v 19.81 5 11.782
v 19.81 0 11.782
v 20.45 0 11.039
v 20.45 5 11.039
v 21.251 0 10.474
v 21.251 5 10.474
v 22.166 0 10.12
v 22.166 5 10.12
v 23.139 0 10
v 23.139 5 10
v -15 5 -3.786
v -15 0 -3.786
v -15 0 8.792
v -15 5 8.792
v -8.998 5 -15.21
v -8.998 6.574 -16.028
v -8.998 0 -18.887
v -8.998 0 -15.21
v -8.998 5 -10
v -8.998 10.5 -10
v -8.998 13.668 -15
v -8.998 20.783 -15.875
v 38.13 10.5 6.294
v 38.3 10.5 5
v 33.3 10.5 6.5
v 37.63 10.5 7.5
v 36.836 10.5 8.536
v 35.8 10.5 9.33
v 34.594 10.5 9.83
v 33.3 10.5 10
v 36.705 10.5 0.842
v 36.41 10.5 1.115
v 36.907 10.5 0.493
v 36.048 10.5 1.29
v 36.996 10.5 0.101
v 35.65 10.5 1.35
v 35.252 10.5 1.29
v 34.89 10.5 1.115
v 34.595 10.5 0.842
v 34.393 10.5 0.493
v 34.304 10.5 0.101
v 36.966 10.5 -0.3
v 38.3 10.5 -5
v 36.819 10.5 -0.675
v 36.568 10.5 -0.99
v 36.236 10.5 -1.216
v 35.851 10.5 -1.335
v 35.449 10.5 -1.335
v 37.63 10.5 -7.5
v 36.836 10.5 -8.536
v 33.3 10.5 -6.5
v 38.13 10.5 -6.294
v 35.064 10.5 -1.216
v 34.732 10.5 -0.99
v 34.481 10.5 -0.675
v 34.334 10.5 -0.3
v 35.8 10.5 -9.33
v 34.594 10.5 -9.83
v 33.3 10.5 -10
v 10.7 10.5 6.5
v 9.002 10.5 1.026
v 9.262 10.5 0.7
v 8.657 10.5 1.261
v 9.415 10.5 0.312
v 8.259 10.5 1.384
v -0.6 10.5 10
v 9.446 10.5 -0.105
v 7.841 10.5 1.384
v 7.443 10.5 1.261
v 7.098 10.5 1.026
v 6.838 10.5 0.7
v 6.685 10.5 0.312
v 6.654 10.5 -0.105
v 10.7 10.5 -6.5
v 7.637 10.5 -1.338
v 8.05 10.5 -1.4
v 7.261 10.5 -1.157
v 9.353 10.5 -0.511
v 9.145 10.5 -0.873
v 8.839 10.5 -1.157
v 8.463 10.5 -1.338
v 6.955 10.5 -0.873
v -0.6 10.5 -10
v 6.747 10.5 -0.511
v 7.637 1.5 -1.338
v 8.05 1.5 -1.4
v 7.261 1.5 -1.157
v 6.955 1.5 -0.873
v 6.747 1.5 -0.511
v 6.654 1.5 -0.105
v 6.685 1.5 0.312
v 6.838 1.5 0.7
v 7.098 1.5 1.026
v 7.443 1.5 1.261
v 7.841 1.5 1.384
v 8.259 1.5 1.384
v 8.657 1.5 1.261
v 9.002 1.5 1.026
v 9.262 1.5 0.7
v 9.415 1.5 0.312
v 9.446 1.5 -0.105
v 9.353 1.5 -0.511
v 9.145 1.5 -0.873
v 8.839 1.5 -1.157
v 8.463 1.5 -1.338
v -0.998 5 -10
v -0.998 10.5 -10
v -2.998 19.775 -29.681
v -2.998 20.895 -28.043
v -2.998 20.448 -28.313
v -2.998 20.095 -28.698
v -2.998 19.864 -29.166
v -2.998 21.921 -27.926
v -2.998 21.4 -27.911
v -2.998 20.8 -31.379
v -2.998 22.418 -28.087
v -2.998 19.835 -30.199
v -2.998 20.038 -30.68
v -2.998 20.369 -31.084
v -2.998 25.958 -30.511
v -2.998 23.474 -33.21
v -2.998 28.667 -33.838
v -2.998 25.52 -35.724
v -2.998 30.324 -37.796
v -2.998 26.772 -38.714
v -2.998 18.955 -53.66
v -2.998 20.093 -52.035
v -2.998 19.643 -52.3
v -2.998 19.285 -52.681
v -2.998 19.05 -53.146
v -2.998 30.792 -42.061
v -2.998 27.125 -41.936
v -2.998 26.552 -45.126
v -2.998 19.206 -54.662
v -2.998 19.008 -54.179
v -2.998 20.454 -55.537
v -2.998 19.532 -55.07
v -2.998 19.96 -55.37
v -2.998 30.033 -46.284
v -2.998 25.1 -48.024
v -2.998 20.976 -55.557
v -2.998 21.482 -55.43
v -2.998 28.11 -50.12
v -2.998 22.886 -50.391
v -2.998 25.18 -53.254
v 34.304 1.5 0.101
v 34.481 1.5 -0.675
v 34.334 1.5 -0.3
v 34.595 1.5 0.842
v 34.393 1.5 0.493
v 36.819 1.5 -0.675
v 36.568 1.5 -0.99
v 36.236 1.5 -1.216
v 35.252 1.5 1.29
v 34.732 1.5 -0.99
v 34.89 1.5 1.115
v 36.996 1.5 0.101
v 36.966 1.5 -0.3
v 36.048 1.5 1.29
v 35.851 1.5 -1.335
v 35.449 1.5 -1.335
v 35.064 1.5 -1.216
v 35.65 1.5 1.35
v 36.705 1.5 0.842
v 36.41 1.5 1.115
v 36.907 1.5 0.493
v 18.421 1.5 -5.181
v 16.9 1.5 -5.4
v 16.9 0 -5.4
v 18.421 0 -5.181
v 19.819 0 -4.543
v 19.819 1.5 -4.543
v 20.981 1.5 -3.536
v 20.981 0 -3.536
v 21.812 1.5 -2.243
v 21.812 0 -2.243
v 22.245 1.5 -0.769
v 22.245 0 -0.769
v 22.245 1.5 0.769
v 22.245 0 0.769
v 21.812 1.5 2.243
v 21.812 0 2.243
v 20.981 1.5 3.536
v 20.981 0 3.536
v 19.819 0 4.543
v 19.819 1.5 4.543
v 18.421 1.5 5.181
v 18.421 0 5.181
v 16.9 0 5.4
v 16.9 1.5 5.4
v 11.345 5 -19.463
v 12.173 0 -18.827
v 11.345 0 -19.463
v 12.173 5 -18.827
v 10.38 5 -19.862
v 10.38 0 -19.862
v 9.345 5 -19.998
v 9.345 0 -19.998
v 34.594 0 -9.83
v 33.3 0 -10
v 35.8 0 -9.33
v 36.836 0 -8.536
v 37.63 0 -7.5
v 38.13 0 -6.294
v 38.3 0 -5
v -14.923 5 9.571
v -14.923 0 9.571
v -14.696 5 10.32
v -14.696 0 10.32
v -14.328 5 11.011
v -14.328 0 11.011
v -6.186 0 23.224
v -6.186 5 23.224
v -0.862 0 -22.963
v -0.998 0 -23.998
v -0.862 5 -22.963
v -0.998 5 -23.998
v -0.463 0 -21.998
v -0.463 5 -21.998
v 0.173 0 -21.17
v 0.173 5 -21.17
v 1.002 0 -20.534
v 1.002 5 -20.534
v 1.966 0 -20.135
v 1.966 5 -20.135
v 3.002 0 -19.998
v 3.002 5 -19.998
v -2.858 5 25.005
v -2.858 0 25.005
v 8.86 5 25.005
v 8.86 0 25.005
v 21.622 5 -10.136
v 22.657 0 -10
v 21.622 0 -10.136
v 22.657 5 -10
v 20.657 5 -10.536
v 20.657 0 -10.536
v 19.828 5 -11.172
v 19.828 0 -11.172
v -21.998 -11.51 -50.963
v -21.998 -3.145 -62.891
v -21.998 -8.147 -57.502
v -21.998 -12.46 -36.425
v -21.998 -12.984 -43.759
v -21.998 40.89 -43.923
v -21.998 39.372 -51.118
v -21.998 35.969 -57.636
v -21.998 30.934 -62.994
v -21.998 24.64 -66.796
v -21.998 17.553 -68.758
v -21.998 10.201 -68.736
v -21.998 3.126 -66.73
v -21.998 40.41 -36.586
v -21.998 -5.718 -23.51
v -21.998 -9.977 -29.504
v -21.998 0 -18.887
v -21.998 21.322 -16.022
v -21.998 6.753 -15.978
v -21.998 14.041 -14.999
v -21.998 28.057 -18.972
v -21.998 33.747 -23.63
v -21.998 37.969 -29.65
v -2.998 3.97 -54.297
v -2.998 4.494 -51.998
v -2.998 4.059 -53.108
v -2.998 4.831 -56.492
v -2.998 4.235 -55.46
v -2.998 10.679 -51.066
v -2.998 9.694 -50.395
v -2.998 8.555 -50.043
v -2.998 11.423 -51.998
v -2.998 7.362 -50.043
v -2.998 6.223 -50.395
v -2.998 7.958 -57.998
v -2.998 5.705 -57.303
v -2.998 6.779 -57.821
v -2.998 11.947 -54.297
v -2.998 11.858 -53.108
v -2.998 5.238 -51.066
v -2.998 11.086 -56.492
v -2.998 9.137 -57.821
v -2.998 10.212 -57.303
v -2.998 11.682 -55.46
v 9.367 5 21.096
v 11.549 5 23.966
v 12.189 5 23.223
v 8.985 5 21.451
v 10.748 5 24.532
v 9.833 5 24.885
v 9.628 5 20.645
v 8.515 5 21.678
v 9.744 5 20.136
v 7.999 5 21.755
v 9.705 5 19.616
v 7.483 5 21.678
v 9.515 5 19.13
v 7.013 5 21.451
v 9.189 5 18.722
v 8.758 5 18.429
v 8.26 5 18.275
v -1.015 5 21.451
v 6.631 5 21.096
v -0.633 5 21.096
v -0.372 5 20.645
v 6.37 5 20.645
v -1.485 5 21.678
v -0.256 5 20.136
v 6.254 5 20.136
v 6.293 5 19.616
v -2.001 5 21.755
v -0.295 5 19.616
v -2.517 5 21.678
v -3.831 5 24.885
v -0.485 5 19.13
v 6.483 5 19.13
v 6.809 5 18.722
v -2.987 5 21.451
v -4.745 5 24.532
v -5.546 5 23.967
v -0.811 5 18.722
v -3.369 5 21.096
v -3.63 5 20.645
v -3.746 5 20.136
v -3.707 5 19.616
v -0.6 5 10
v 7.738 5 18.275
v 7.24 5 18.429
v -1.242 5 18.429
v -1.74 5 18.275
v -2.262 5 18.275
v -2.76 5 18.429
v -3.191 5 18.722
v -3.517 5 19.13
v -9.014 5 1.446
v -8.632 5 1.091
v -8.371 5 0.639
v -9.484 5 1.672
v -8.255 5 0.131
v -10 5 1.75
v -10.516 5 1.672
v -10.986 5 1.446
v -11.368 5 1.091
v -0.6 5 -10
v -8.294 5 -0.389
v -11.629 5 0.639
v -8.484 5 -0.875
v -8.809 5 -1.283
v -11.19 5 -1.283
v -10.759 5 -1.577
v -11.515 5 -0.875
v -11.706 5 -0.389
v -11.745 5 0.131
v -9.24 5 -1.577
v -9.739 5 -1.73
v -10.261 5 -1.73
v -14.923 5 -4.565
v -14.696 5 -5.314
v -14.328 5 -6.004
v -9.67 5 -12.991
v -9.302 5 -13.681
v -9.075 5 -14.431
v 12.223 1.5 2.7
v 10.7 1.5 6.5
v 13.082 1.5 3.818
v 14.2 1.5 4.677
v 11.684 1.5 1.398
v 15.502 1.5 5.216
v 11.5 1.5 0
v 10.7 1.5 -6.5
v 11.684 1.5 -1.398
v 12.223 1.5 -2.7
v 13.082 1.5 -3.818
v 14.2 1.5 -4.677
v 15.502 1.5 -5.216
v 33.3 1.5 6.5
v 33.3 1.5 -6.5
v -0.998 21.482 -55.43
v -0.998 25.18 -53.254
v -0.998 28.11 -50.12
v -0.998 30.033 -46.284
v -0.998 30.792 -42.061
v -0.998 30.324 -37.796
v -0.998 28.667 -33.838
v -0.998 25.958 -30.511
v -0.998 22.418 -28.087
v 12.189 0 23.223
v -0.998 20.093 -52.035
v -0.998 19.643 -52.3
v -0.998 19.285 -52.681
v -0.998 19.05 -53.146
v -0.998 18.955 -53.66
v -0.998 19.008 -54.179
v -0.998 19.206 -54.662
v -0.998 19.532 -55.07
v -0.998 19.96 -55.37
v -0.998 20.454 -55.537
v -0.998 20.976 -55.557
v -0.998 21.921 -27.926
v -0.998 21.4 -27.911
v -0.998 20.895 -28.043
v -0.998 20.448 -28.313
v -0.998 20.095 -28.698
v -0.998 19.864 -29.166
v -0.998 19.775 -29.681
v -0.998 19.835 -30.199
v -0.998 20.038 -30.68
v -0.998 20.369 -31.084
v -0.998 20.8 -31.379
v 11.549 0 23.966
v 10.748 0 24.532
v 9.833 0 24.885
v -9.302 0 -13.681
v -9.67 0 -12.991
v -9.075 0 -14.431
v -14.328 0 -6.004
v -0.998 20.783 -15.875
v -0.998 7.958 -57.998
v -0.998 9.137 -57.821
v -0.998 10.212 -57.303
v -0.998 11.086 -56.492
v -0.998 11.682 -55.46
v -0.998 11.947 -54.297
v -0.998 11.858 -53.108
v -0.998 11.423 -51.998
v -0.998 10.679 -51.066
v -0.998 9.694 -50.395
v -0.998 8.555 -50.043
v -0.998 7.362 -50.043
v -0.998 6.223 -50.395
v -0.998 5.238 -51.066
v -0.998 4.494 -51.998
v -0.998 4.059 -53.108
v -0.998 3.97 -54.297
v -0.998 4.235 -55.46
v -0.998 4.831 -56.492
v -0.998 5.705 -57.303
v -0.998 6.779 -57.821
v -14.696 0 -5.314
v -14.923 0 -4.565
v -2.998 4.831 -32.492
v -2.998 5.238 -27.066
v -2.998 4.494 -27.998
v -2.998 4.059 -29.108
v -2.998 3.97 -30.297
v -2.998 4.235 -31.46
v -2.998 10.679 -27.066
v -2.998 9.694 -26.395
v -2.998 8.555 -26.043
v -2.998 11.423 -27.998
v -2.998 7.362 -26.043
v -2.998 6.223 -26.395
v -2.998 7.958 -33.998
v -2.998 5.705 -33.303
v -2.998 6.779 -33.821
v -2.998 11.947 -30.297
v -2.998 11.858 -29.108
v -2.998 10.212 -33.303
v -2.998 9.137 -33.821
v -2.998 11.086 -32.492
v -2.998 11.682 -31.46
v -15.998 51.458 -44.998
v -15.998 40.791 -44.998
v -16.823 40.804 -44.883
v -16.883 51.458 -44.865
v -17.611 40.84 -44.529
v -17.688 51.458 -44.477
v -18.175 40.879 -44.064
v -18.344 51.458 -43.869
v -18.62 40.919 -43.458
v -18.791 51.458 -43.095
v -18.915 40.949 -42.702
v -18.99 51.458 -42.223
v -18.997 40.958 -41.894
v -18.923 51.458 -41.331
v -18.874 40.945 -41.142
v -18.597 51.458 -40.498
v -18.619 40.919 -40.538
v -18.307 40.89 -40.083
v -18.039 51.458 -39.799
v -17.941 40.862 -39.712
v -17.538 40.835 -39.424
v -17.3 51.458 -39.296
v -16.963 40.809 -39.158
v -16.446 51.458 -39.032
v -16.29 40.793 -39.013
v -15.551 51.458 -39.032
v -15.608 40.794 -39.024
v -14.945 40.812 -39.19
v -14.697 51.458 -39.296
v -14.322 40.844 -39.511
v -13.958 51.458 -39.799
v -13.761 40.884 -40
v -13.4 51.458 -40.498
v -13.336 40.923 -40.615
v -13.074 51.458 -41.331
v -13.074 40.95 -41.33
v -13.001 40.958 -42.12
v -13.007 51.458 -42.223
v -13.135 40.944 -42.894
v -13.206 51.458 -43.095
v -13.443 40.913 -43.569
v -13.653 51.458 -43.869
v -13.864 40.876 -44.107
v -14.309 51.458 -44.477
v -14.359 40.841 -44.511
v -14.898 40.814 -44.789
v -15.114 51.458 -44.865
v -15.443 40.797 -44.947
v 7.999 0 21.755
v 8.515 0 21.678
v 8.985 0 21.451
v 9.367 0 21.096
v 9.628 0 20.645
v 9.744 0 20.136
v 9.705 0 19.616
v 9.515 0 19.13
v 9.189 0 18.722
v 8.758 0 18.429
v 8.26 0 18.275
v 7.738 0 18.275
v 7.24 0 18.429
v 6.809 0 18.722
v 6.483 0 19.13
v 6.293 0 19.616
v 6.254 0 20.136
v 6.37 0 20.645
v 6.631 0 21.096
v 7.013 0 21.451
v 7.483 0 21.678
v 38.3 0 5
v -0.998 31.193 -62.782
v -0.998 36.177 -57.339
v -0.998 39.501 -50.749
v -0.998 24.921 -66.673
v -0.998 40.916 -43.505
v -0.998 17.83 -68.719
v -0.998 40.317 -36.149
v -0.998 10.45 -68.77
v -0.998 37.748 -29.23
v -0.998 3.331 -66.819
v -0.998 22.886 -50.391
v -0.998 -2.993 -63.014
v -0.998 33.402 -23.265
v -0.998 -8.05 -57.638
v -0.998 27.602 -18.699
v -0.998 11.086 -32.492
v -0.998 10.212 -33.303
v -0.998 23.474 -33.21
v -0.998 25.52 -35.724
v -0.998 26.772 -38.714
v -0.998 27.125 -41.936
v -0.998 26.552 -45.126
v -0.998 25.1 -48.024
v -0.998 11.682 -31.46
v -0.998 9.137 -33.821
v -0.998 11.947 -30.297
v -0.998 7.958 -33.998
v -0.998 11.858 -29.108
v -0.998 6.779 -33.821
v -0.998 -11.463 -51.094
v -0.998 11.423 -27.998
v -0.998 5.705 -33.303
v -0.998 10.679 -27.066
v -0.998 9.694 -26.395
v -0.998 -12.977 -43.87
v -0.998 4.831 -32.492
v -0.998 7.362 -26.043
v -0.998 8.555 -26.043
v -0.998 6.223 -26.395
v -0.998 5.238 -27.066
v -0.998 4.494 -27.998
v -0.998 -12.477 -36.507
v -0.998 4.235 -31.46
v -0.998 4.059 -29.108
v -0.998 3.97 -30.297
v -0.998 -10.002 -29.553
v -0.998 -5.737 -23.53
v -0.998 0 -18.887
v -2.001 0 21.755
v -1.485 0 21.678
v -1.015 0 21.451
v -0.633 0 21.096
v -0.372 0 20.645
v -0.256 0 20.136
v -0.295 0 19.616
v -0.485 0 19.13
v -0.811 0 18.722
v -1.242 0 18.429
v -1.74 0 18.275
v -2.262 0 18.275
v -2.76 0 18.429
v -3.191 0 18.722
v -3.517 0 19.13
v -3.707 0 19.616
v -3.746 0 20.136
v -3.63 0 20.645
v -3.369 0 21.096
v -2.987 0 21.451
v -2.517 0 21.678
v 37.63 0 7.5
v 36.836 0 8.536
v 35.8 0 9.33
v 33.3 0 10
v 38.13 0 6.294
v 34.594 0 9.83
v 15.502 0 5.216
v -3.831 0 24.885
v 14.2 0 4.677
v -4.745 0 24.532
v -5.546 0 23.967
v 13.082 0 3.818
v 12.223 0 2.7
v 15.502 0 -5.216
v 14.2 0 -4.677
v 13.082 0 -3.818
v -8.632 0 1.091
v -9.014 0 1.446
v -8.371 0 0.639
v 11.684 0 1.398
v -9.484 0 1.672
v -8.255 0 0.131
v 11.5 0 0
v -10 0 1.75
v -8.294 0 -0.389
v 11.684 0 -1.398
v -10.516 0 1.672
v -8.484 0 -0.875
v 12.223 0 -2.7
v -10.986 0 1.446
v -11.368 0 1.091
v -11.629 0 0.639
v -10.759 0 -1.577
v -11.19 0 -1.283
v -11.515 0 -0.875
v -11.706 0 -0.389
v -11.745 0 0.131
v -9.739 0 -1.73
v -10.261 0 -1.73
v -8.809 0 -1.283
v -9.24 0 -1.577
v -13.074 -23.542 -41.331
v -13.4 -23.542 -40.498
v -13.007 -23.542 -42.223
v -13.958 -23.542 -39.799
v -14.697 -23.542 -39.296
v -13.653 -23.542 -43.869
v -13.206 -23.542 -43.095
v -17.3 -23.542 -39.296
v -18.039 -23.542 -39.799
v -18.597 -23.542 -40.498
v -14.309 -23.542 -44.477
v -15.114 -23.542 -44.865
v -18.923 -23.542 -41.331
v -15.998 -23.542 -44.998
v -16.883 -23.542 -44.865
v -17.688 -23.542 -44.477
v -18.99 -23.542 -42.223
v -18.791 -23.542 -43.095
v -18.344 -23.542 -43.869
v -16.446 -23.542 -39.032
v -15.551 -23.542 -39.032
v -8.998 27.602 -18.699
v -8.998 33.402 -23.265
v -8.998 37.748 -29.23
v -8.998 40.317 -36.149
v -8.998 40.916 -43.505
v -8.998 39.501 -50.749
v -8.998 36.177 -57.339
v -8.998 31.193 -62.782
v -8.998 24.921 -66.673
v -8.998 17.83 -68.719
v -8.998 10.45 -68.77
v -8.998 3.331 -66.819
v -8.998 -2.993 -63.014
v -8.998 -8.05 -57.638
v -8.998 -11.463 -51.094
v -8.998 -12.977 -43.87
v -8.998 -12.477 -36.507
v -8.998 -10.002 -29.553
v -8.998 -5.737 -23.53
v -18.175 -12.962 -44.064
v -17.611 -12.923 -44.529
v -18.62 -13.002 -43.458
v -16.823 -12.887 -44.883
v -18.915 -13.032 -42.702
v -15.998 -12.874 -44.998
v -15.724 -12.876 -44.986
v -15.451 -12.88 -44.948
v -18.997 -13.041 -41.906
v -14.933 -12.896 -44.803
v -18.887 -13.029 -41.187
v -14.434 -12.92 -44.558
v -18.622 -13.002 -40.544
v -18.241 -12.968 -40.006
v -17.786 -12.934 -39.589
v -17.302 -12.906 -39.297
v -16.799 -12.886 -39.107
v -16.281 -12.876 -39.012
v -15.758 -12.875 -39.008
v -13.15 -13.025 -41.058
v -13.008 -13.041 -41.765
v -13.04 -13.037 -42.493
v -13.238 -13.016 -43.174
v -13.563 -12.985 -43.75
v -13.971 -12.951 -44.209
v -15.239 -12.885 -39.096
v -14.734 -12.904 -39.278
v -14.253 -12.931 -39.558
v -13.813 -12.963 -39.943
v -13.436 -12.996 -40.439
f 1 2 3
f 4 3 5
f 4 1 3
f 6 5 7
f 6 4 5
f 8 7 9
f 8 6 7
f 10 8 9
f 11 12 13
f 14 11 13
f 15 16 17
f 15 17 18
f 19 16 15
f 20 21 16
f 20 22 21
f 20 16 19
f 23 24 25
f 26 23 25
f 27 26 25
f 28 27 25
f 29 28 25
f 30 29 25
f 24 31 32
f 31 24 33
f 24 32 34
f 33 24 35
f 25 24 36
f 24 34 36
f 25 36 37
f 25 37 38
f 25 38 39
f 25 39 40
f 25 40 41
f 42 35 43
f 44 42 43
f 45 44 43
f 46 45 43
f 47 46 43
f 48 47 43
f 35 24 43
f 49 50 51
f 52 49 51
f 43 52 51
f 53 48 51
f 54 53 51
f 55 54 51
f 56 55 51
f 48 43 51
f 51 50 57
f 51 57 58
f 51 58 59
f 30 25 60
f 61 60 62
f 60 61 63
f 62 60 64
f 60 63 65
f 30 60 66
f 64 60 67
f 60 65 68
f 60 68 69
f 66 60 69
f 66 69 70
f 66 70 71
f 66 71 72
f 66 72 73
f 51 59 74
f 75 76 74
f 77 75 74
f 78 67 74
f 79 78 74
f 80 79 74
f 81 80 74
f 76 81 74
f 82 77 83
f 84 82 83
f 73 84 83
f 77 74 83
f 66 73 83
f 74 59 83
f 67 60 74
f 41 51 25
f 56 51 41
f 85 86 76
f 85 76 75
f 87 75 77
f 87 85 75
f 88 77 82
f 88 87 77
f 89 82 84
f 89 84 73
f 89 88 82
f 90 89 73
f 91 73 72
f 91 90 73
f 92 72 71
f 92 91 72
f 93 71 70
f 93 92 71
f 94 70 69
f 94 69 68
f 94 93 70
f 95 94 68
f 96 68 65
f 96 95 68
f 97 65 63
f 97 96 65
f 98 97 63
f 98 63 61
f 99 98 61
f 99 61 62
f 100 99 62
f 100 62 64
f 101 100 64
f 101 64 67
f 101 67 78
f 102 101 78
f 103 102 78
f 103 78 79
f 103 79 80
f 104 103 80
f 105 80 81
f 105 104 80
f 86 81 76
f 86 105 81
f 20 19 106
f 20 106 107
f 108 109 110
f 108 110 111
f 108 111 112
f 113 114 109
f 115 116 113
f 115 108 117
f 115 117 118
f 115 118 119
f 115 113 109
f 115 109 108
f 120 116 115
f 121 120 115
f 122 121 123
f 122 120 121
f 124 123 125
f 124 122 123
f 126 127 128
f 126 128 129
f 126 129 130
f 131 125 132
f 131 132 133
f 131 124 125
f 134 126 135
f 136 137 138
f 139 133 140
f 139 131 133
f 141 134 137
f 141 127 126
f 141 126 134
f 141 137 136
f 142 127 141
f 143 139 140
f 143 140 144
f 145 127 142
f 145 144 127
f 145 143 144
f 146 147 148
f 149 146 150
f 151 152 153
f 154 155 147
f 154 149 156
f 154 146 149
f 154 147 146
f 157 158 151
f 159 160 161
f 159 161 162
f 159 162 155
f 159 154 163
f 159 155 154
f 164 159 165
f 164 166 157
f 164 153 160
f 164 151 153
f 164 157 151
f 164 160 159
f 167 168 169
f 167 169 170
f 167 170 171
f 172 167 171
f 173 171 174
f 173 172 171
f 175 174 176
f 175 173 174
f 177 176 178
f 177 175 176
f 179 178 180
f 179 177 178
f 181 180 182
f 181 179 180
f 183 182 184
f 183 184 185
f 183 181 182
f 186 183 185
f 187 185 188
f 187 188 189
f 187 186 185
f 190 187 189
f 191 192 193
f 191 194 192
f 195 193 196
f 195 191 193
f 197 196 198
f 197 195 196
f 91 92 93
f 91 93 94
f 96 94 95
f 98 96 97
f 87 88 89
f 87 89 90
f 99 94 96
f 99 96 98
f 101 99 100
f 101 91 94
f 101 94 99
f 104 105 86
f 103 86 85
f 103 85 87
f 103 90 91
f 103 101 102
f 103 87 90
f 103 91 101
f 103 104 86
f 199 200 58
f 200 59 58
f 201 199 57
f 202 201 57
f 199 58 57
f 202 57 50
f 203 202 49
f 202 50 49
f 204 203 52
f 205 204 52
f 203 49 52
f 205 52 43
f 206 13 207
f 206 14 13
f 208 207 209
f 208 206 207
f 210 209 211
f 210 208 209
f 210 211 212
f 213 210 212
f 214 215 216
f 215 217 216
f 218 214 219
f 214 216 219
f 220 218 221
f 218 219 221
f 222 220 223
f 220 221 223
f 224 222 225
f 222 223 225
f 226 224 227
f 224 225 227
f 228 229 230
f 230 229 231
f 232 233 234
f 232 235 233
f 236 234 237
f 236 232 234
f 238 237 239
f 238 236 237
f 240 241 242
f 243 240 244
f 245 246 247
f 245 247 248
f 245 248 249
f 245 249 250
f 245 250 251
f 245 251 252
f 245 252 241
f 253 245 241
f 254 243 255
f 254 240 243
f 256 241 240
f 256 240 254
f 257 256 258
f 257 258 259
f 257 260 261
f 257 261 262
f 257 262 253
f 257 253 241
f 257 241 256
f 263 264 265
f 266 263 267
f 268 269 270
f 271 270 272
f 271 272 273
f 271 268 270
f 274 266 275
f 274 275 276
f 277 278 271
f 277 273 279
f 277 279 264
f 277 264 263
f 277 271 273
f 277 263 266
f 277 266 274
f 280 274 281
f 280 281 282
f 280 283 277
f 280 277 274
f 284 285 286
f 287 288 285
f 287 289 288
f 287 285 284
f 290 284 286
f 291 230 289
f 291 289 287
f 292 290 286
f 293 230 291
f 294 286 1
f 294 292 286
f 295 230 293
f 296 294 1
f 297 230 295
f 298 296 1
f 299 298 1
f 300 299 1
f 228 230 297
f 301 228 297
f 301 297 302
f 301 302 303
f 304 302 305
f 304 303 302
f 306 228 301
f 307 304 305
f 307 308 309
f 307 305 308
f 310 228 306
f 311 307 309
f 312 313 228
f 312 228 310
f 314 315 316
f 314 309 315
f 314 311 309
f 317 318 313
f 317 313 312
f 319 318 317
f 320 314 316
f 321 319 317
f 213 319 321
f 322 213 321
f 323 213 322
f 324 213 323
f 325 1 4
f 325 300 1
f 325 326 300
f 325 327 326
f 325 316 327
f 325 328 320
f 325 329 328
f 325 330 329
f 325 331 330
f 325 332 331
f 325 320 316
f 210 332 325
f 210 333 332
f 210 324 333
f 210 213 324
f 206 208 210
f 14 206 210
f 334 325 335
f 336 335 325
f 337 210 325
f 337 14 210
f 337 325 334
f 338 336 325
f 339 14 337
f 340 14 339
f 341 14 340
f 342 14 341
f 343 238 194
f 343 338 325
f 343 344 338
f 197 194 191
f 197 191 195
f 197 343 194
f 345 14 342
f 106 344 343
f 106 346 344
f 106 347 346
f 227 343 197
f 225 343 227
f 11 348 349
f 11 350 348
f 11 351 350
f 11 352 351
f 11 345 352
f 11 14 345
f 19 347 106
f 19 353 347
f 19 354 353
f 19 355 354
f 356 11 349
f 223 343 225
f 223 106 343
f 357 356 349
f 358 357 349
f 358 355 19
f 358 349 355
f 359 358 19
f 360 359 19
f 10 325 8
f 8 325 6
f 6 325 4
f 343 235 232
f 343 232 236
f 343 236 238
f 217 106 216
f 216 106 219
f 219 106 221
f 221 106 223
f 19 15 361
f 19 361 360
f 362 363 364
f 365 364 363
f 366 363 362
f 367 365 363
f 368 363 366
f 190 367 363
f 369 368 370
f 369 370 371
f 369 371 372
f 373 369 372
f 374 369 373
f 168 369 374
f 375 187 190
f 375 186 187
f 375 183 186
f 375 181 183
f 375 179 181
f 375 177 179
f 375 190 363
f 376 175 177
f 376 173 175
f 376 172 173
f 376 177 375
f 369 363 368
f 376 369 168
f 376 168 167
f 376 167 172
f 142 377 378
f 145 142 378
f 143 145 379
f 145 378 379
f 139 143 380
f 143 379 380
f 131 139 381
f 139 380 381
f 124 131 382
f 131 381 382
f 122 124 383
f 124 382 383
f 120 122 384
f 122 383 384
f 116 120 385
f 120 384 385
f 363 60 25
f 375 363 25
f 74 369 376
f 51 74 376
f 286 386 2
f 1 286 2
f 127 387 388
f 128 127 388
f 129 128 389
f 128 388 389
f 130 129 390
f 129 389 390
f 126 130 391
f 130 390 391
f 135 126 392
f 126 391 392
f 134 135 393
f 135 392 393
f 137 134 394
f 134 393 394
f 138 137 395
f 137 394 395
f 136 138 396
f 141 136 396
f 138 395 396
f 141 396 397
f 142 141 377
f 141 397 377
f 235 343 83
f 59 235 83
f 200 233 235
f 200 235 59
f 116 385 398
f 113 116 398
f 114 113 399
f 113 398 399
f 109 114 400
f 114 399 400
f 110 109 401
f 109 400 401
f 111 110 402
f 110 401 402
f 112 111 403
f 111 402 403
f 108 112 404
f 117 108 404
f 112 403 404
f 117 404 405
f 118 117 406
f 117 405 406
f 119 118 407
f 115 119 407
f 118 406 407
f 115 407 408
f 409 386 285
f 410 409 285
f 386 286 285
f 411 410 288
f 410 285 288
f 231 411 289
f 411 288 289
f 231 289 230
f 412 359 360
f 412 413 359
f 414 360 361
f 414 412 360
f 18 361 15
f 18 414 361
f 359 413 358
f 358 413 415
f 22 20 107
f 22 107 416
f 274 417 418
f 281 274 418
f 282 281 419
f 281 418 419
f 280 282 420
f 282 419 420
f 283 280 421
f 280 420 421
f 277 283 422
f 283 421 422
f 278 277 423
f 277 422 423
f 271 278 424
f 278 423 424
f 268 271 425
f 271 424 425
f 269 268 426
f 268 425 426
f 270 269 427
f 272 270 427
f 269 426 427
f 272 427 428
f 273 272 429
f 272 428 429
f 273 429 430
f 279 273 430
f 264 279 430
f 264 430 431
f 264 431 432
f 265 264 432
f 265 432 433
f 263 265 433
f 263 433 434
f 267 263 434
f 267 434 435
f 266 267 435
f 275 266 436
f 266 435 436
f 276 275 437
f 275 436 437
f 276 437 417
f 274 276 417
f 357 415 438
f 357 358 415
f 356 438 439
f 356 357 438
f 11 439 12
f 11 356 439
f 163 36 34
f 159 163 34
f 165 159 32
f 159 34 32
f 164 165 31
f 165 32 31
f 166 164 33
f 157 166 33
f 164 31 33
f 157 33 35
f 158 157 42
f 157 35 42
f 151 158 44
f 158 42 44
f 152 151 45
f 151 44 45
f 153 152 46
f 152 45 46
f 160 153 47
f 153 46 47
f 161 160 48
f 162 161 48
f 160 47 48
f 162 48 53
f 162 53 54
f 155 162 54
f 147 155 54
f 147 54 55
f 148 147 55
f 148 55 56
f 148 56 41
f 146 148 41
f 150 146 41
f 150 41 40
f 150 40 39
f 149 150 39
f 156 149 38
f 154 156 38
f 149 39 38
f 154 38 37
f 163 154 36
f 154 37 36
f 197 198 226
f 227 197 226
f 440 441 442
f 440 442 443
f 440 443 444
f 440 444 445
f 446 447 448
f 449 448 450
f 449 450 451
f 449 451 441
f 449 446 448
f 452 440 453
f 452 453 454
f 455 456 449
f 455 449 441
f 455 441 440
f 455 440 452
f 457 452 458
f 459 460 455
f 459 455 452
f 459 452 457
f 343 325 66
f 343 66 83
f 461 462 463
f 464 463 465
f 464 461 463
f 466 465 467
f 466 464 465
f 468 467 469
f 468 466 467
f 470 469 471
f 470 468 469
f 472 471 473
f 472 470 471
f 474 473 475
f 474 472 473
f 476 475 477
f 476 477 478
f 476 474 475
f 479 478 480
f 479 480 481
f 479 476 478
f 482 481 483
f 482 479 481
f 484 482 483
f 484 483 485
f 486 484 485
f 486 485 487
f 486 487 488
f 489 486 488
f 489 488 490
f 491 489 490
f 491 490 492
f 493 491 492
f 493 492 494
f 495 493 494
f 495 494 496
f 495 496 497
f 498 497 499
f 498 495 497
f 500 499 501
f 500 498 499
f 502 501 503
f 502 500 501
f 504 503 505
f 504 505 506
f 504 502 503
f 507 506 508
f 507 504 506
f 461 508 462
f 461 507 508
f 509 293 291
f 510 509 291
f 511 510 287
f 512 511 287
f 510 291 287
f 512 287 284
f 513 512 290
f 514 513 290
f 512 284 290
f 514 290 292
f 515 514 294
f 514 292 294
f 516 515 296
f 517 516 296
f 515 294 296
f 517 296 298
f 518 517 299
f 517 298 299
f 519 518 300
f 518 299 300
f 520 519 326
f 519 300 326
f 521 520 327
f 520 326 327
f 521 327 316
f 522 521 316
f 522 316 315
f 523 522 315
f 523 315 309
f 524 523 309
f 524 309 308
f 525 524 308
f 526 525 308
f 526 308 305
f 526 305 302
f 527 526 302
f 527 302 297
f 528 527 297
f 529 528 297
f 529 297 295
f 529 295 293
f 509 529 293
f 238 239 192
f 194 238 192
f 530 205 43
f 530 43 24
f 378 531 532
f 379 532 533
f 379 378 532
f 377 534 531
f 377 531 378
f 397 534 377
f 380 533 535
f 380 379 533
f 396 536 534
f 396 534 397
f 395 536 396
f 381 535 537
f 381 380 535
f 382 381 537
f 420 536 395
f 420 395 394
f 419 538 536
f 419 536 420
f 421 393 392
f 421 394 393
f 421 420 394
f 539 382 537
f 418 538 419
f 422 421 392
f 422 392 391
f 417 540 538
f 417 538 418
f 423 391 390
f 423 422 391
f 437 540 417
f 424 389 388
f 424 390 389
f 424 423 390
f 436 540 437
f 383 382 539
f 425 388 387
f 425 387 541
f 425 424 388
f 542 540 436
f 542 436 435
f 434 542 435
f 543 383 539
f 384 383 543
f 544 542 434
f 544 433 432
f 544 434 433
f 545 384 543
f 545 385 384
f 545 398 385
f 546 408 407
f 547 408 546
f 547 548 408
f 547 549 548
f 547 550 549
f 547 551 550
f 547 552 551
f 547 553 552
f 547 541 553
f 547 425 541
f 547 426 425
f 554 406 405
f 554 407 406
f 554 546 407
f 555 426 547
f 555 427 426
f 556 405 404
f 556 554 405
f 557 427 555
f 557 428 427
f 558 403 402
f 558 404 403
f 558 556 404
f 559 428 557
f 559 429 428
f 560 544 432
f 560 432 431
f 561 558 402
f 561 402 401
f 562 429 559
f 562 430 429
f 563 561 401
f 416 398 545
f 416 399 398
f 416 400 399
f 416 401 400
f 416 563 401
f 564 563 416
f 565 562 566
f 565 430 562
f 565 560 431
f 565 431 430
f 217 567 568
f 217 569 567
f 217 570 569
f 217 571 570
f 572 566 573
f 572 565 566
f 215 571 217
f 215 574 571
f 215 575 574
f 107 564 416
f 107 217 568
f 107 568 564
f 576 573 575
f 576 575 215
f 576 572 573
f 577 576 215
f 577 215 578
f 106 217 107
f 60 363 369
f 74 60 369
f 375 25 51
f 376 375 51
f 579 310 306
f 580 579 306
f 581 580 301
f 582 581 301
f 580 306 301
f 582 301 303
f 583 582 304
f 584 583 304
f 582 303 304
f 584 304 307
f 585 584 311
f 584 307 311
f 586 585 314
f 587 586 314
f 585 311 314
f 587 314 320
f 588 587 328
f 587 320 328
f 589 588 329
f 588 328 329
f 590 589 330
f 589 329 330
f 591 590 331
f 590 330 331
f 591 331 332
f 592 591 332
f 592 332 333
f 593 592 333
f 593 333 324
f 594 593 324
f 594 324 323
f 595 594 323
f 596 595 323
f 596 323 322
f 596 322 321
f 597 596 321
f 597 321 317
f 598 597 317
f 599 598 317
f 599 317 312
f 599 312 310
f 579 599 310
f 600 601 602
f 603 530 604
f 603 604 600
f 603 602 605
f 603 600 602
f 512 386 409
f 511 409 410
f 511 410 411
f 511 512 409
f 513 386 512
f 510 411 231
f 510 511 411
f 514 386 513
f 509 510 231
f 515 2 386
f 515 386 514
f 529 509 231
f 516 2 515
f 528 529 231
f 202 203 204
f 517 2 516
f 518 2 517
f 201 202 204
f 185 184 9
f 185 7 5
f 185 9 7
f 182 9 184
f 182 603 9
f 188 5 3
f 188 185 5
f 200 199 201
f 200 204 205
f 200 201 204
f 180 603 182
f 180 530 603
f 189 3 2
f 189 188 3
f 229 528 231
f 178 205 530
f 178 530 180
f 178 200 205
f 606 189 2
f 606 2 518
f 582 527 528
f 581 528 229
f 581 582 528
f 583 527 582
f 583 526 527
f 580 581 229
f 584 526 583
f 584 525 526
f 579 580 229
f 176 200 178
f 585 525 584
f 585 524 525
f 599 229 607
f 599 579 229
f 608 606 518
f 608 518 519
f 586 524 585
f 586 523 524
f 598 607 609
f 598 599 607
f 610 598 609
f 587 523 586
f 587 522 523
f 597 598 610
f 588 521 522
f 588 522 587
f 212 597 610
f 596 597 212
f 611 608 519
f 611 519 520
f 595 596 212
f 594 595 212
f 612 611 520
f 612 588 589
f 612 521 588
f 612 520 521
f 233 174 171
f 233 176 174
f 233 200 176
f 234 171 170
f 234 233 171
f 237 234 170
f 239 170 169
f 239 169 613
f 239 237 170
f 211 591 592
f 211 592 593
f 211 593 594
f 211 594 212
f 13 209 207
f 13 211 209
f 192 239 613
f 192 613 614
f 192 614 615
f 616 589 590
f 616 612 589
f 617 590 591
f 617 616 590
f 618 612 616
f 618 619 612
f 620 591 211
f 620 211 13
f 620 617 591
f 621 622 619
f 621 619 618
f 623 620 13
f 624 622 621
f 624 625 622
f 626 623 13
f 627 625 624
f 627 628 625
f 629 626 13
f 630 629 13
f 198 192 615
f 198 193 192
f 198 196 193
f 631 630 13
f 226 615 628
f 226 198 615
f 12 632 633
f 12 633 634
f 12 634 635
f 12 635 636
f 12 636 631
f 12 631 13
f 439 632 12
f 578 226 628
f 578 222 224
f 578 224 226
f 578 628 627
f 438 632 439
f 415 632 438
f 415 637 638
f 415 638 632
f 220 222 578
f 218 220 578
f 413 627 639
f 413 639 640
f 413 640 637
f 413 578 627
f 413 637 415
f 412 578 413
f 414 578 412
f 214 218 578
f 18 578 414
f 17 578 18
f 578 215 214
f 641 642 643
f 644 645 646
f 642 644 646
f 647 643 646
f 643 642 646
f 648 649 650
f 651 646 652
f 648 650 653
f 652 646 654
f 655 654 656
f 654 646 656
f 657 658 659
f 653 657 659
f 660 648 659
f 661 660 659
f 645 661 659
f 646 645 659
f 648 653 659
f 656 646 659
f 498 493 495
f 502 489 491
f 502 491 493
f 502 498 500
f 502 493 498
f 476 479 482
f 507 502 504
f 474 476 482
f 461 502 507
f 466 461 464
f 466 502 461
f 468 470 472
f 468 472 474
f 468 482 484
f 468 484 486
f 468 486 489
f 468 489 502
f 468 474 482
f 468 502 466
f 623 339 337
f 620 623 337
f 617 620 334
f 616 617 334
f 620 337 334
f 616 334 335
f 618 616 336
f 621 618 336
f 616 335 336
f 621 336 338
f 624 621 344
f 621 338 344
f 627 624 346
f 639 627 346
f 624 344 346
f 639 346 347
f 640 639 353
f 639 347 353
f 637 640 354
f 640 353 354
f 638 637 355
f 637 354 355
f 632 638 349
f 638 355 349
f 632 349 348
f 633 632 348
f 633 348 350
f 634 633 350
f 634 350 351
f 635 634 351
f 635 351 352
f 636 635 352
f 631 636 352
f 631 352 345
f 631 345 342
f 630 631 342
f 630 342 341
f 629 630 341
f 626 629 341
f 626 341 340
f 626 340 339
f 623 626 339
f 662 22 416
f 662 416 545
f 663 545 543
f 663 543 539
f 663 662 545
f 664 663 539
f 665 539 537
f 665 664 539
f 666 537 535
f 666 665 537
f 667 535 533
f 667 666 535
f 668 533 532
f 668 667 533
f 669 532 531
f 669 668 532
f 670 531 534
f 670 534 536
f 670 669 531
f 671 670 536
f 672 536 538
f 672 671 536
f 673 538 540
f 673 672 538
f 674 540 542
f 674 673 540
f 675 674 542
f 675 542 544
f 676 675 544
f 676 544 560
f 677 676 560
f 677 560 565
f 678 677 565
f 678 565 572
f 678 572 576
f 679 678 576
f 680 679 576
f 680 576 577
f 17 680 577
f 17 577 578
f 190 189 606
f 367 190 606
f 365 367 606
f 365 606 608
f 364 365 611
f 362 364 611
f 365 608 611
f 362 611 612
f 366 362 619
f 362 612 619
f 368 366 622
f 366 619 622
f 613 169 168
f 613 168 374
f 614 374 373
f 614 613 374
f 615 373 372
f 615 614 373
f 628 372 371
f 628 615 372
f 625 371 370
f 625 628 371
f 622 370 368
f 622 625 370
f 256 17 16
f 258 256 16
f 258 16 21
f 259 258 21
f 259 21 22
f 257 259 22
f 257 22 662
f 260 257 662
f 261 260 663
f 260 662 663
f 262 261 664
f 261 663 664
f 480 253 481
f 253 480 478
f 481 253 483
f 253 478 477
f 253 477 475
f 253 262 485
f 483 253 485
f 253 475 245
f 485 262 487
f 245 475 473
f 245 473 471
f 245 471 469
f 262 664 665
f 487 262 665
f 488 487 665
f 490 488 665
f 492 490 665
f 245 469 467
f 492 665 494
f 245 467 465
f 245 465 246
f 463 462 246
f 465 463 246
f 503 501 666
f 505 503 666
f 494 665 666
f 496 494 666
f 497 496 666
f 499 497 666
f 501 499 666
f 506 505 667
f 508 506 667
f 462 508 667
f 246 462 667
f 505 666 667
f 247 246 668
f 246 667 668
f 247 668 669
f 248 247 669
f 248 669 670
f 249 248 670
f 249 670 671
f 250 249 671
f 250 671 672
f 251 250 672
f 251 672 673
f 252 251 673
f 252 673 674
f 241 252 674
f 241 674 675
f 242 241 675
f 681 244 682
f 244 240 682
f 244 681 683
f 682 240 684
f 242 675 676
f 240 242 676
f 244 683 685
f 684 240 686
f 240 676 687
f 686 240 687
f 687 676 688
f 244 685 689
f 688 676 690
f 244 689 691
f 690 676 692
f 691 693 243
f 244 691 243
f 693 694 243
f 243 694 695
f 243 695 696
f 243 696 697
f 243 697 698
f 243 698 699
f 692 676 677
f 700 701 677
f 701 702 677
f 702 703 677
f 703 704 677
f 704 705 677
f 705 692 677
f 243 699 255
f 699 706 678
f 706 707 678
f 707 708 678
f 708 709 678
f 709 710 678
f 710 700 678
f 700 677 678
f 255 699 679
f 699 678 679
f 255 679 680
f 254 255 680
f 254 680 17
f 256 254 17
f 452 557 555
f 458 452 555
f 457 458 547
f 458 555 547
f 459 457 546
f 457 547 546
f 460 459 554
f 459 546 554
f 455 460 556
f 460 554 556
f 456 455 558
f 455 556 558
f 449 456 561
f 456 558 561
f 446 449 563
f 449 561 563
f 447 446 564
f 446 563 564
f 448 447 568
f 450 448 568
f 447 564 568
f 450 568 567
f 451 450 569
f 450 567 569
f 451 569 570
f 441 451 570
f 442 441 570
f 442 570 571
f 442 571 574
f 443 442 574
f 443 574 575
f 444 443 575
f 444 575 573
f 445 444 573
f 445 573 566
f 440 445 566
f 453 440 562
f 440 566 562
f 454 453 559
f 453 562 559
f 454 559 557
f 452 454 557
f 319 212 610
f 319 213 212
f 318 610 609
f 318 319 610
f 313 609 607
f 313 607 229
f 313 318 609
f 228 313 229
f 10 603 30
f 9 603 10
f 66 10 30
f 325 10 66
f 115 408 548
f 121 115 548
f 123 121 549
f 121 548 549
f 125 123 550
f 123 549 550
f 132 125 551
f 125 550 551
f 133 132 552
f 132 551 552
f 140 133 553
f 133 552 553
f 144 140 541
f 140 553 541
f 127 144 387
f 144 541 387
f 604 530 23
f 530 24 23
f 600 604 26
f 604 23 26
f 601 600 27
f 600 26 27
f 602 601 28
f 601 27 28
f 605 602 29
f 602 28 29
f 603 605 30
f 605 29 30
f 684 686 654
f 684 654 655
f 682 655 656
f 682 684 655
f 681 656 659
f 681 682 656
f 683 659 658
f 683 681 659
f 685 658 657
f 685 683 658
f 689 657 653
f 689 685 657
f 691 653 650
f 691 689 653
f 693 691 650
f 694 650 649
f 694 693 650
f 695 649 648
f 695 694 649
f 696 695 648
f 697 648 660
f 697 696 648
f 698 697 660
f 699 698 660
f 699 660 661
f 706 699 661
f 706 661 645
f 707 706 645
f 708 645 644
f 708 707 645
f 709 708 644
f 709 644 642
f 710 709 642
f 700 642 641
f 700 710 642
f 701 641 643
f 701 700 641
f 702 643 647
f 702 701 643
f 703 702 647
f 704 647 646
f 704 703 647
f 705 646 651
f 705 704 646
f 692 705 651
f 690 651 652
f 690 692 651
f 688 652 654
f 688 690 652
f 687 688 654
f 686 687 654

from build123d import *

# Parameters (mm, degrees)
BOSS_EXTRUDE1_DEPTH             = 5
SKETCH2_R                       = 1.75
SKETCH2_W                       = 10.8
SKETCH2_H                       = 10.8
CUT_EXTRUDE1_DEPTH              = 52.722948416
FILLET1_R                       = 5.4
FILLET2_R                       = 5.4
FILLET3_RADIUS                  = 10
FILLET3_LENGTH                  = 5
SKETCH3_W                       = 35
SKETCH3_H                       = 20
SKETCH3_W_2                     = 23
SKETCH3_H_2                     = 13
BOSS_EXTRUDE2_DEPTH             = 5.5
SKETCH4_W                       = 23
SKETCH4_H                       = 13
CUT_EXTRUDE2_DEPTH              = 3.5
CUT_EXTRUDE3_DEPTH              = 52.773674709
FILLET4_R                       = 4
SKETCH6_W                       = 8
SKETCH6_H                       = 28
BOSS_EXTRUDE3_DEPTH             = 32
FILLET5_R                       = 8
BOSS_EXTRUDE6_DEPTH             = 8
FILLET6_R                       = 4
SKETCH10_W                      = 5.3
SKETCH10_H                      = 13
SKETCH10_R                      = 1.4
BOSS_EXTRUDE7_DEPTH             = 9
BOSS_EXTRUDE8_START             = -10.5
BOSS_EXTRUDE8_DEPTH             = 10.5
SKETCH12_R                      = 1.35
CUT_EXTRUDE4_DEPTH              = 9
FILLET8_R                       = 5
SKETCH13_W                      = 4.9
SKETCH13_H                      = 13
CUT_EXTRUDE5_DEPTH              = 9
SKETCH14_R                      = 3
CUT_EXTRUDE6_DEPTH              = 71.938101594
FILLET10_R                      = 4
BOSS_EXTRUDE9_REACH             = 77.664
SKETCH15_R                      = 27
BOSS_EXTRUDE9_DIRECTION_2_DEPTH = 13
SKETCH17_R                      = 3
BOSS_EXTRUDE10_DEPTH            = 37.5
SKETCH18_R                      = 4
CUT_EXTRUDE7_DEPTH              = 2


# Some blends are built 0.0001 mm under size
with BuildPart() as part:
    # Sketch1 → Boss-Extrude1 (new body)
    with BuildSketch(Plane(origin=(0, 0, 0), x_dir=(1, 0, 0), z_dir=(0, 1, 0))):
        Polygon((45, -10), (45, 10), (21, 10), (11.001510114, 19.998489886), (-4.998489886, 19.998489886), (-14.999716743, 4.996611292), (-14.999716743, -10.003388708), (-4.998489886, -25.005267302), (11.001510114, -25.005267302), (20.99765203, -10), align=None)
    extrude(amount=BOSS_EXTRUDE1_DEPTH)

    # Sketch2 → Cut-Extrude1 (cut, through all)
    with BuildSketch(Plane(origin=(0, 5, 0), x_dir=(1, 0, 0), z_dir=(0, 1, 0))):
        with Locations(Location((-9.999716743, 0, 0), (0, 0, 270))):
            Circle(SKETCH2_R)
        with Locations(Location((-2.001032357, -20.005267302, 0), (0, 0, 270))):
            Circle(SKETCH2_R)
        with Locations(Location((7.998967643, -20.005267302, 0), (0, 0, 270))):
            Circle(SKETCH2_R)
        with Locations((16.9, 0)):
            Rectangle(SKETCH2_W, SKETCH2_H)
    extrude(amount=-CUT_EXTRUDE1_DEPTH, mode=Mode.SUBTRACT)

    # Fillet1
    fillet1_edges = [part.edges().sort_by_distance(p)[0] for p in [
        (11.5, 2.5, 5.4),
        (11.5, 2.5, -5.4),
    ]]
    fillet(fillet1_edges, radius=FILLET1_R - 0.0001)  # a hair under: the kernel refuses the full size

    # Fillet2
    # the kernel refuses this fillet: 5.4 mm, written as the material it adds along each edge
    with BuildSketch(Plane(origin=(22.3, 5, -5.4), x_dir=(0, 0, 1), z_dir=(0, -1, 0)), Plane(origin=(22.3, 5, 5.4), x_dir=(-1, 0, 0), z_dir=(0, -1, 0))) as fillet2_piece_1:
        with BuildLine():
            CenterArc((FILLET2_R, FILLET2_R), FILLET2_R, 180, 90)
            Line((0, FILLET2_R), (0, 0))
            Line((0, 0), (FILLET2_R, 0))
        make_face()
    extrude(amount=5)
    # the kernel refuses this fillet: 5.4 mm, written as the material it takes off along each edge

    # Fillet3: full round fillet: the end face becomes a half cylinder, R = half its width
    fillet3_face = Plane((45, 2.5, 0), x_dir=(0, 1, 0), z_dir=(1, 0, 0))  # on the end face: x along it, z out of the body
    fillet3_slab = fillet3_face.offset(-FILLET3_RADIUS / 2) * Box(FILLET3_LENGTH, 2 * FILLET3_RADIUS, FILLET3_RADIUS, mode=Mode.PRIVATE)  # the body's end, R deep
    fillet3_round = Plane((35, 2.5, 0), x_dir=(1, 0, 0), z_dir=(0, 1, 0)) * Cylinder(FILLET3_RADIUS, FILLET3_LENGTH, mode=Mode.PRIVATE)  # its axis R under the face
    add(fillet3_slab - fillet3_round, mode=Mode.SUBTRACT)

    # Sketch3 → Boss-Extrude2 (add)
    with BuildSketch(Plane(origin=(0, 5, 0), x_dir=(1, 0, 0), z_dir=(0, 1, 0))):
        with Locations((16.9, 0)):
            Rectangle(SKETCH3_W, SKETCH3_H)
        with Locations((16.9, 0)):
            Rectangle(SKETCH3_W_2, SKETCH3_H_2, mode=Mode.SUBTRACT)
    extrude(amount=BOSS_EXTRUDE2_DEPTH)

    # Sketch4 → Cut-Extrude2 (cut)
    with BuildSketch(Plane(origin=(0, 5, 0), x_dir=(1, 0, 0), z_dir=(0, 1, 0))):
        with Locations((16.9, 0)):
            Rectangle(SKETCH4_W, SKETCH4_H)
    extrude(amount=-CUT_EXTRUDE2_DEPTH, mode=Mode.SUBTRACT)

    # Sketch5 → Cut-Extrude3 (cut, through all)
    with BuildSketch(Plane(origin=(0, 5, 0), x_dir=(1, 0, 0), z_dir=(0, 1, 0))):
        with BuildLine():
            Line((34.4, 10), (34.4, -10))
            Line((34.4, -10), (35, -10))
            ThreePointArc((35, -10), (45, 0), (35, 10))
            Line((35, 10), (34.4, 10))
        make_face()
    extrude(amount=-CUT_EXTRUDE3_DEPTH, mode=Mode.SUBTRACT)

    # Fillet4
    fillet4_edges = [part.edges().sort_by_distance(p)[0] for p in [
        (34.4, 5.25, 10),
        (34.4, 5.25, -10),
    ]]
    fillet(fillet4_edges, radius=FILLET4_R)

    # Sketch6 → Boss-Extrude3 (add)
    with BuildSketch(Plane(origin=(0, 0, -19.998489886), x_dir=(-1, 0, 0), z_dir=(0, 0, -1))):
        with Locations((4.998489886, 14)):
            Rectangle(SKETCH6_W, SKETCH6_H)
    extrude(amount=BOSS_EXTRUDE3_DEPTH)

    # Fillet5
    fillet5_edges = [part.edges().sort_by_distance(p)[0] for p in [
        (-4.998489886, 0, -51.998489886),
        (-4.998489886, 28, -51.998489886),
    ]]
    fillet(fillet5_edges, radius=FILLET5_R)

    # Sketch9 → Boss-Extrude6 (add)
    with BuildSketch(Plane.ZY.offset(8.998489886)):
        Polygon((-10, 10.5), (-19.998489886, 28), (-19.998489886, 0), (-10, 0), align=None)
    extrude(amount=-BOSS_EXTRUDE6_DEPTH)

    # Fillet6
    fillet6_edges = [part.edges().sort_by_distance(p)[0] for p in [
        (-0.998489886, 2.5, -19.998489886),
        (20.99765203, 2.5, 10),
        (11.001510114, 2.5, 25.005267302),
        (-4.998489886, 2.5, 25.005267302),
        (-14.999716743, 2.5, 10.003388708),
        (-14.999716743, 2.5, -4.996611292),
        (11.001510114, 2.5, -19.998489886),
        (21, 2.5, -10),
        (-8.998489886, 2.5, -13.998474565),
    ]]
    fillet(fillet6_edges, radius=FILLET6_R)

    # Sketch10 → Boss-Extrude7 (add)
    with BuildSketch(Plane(origin=(0, 1.5, 0), x_dir=(1, 0, 0), z_dir=(0, 1, 0))):
        with Locations((8.05, 0)):
            Rectangle(SKETCH10_W, SKETCH10_H)
        with Locations(Location((8.05, 0, 0), (0, 0, 90))):
            Circle(SKETCH10_R, mode=Mode.SUBTRACT)
    extrude(amount=BOSS_EXTRUDE7_DEPTH)

    # Sketch11 → Boss-Extrude8 (add)
    with BuildSketch(Plane(origin=(0, 10.5, 0), x_dir=(1, 0, 0), z_dir=(0, 1, 0)).offset(BOSS_EXTRUDE8_START)):
        with BuildLine():
            Line((30.4, 10), (38.3, 10))
            Line((38.3, 10), (38.3, -10))
            Line((38.3, -10), (30.4, -10))
            ThreePointArc((30.4, -10), (33.228427125, -8.828427125), (34.4, -6))
            Line((34.4, -6), (34.4, 6))
            ThreePointArc((34.4, 6), (33.228427125, 8.828427125), (30.4, 10))
        make_face()
    extrude(amount=BOSS_EXTRUDE8_DEPTH)

    # Sketch12 → Cut-Extrude4 (cut)
    with BuildSketch(Plane(origin=(0, 10.5, 0), x_dir=(1, 0, 0), z_dir=(0, 1, 0))):
        with Locations(Location((35.65, 0, 0), (0, 0, 270))):
            Circle(SKETCH12_R)
    extrude(amount=-CUT_EXTRUDE4_DEPTH, mode=Mode.SUBTRACT)

    # Fillet8
    fillet8_edges = [part.edges().sort_by_distance(p)[0] for p in [
        (38.3, 5.25, -10),
        (38.3, 5.25, 10),
    ]]
    fillet(fillet8_edges, radius=FILLET8_R)

    # Sketch13 → Cut-Extrude5 (cut)
    with BuildSketch(Plane(origin=(0, 10.5, 0), x_dir=(1, 0, 0), z_dir=(0, 1, 0))):
        with Locations((30.85, 0)):
            Rectangle(SKETCH13_W, SKETCH13_H)
    extrude(amount=-CUT_EXTRUDE5_DEPTH, mode=Mode.SUBTRACT)

    # Sketch14 → Cut-Extrude6 (cut, through all)
    with BuildSketch(Plane(origin=(-0.998489886, 0, 0), x_dir=(0, 0, -1), z_dir=(1, 0, 0))):
        with Locations((41, 22)):
            Circle(SKETCH14_R)
        with Locations((41, 6)):
            Circle(SKETCH14_R)
    extrude(amount=-CUT_EXTRUDE6_DEPTH, mode=Mode.SUBTRACT)

    # Fillet10
    fillet10_edges = [part.edges().sort_by_distance(p)[0] for p in [
        (-4.998489886, 28, -19.998489886),
    ]]
    fillet(fillet10_edges, radius=FILLET10_R)

    # Boss-Extrude9: up to this face of the body (flat: up to its plane)
    boss_extrude9_end = Plane(part.part.faces().sort_by_distance((-0.998489886, 14.084187899, -32.543371898))[0])
    # Sketch15 → Boss-Extrude9 (add, up to the picked face)
    with BuildSketch(Plane.ZY.offset(8.998489886), mode=Mode.PRIVATE) as boss_extrude9_sk1:
        with Locations(Location((-41.998489886, 13.958456326, 0), (0, 0, 328.870116099))):
            Circle(SKETCH15_R)
    boss_extrude9_tool1 = split(extrude(boss_extrude9_sk1.sketch, amount=-BOSS_EXTRUDE9_REACH, mode=Mode.PRIVATE), bisect_by=boss_extrude9_end, keep=Keep.BOTH, mode=Mode.PRIVATE)
    add(boss_extrude9_tool1.solids().sort_by(Axis((-8.99849, 13.958456, -41.99849), (1, 0, 0)))[0])

    # Sketch15 → Boss-Extrude9 direction 2 (add)
    with BuildSketch(Plane.ZY.offset(8.998489886)):
        with Locations(Location((-41.998489886, 13.958456326, 0), (0, 0, 328.870116099))):
            Circle(SKETCH15_R)
    extrude(amount=BOSS_EXTRUDE9_DIRECTION_2_DEPTH)

    # Sketch17 → Boss-Extrude10 (add, symmetric)
    with BuildSketch(Plane(origin=(0, 13.958456326, 0), x_dir=(1, 0, 0), z_dir=(0, 1, 0))):
        with Locations(Location((-15.998489886, 41.998489886, 0), (0, 0, 90))):
            Circle(SKETCH17_R)
    extrude(amount=BOSS_EXTRUDE10_DEPTH, both=True)

    # Sketch18 → Cut-Extrude7 (cut)
    with BuildSketch(Plane(origin=(-0.998489886, 0, 0), x_dir=(0, 0, -1), z_dir=(1, 0, 0))):
        with Locations((53.998489886, 7.958456326)):
            Circle(SKETCH18_R)
        with Locations((29.998489886, 7.958456326)):
            Circle(SKETCH18_R)
        with BuildLine():
            ThreePointArc((55.430471337, 21.482233331), (42.06121766, 30.791596739), (28.086871666, 22.41789714))
            ThreePointArc((28.086871666, 22.41789714), (28.923742357, 19.962632481), (31.379007016, 20.799503173))
            ThreePointArc((31.379007016, 20.799503173), (41.935762112, 27.125315913), (52.035407344, 20.092666969))
            ThreePointArc((52.035407344, 20.092666969), (54.427722522, 19.089918153), (55.430471337, 21.482233331))
        make_face()
    extrude(amount=-CUT_EXTRUDE7_DEPTH, mode=Mode.SUBTRACT)


solid = part.part
